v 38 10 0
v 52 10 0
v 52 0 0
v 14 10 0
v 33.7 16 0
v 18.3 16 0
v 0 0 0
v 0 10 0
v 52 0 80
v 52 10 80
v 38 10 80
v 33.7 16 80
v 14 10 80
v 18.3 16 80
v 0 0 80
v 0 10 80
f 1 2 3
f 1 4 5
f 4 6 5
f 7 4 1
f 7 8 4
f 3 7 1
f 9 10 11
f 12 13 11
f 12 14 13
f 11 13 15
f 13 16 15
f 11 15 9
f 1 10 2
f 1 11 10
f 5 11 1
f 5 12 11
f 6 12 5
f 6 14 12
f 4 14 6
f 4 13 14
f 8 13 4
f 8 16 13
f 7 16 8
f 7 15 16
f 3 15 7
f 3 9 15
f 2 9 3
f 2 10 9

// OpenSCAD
$fn = 32;

// ----------------------------------------------------------------------
// V guide rail: dovetail, 52 mm wide
// ----------------------------------------------------------------------

// --- parameters (mm) ---
rail_w = 52;              // rail width, X
base_t = 10;              // base plate thickness
v_depth = 6;              // V feature depth / height
v_half_w = 12;            // half width of the V at the base face
plate_t = 80;             // rail length, Z (the extrusion height)
top_half_w = 7.7;         // half width at the dovetail top
fit_tol = 0.1;            // declared fit tolerance (prompt contract)
free_tol = 0.3;           // declared free tolerance (prompt contract)

dovetail_base = 2 * v_half_w;  // dovetail width at the base
dovetail_top = 2 * top_half_w;  // dovetail width at the top

profile = [[0, 0], [52, 0], [52, 10], [38, 10], [33.7, 16], [18.3, 16], [14, 10], [0, 10]];  // primary outline, 8 points, counter clockwise

// --- the one profile operation ---
linear_extrude(height = plate_t) polygon(points = profile);
